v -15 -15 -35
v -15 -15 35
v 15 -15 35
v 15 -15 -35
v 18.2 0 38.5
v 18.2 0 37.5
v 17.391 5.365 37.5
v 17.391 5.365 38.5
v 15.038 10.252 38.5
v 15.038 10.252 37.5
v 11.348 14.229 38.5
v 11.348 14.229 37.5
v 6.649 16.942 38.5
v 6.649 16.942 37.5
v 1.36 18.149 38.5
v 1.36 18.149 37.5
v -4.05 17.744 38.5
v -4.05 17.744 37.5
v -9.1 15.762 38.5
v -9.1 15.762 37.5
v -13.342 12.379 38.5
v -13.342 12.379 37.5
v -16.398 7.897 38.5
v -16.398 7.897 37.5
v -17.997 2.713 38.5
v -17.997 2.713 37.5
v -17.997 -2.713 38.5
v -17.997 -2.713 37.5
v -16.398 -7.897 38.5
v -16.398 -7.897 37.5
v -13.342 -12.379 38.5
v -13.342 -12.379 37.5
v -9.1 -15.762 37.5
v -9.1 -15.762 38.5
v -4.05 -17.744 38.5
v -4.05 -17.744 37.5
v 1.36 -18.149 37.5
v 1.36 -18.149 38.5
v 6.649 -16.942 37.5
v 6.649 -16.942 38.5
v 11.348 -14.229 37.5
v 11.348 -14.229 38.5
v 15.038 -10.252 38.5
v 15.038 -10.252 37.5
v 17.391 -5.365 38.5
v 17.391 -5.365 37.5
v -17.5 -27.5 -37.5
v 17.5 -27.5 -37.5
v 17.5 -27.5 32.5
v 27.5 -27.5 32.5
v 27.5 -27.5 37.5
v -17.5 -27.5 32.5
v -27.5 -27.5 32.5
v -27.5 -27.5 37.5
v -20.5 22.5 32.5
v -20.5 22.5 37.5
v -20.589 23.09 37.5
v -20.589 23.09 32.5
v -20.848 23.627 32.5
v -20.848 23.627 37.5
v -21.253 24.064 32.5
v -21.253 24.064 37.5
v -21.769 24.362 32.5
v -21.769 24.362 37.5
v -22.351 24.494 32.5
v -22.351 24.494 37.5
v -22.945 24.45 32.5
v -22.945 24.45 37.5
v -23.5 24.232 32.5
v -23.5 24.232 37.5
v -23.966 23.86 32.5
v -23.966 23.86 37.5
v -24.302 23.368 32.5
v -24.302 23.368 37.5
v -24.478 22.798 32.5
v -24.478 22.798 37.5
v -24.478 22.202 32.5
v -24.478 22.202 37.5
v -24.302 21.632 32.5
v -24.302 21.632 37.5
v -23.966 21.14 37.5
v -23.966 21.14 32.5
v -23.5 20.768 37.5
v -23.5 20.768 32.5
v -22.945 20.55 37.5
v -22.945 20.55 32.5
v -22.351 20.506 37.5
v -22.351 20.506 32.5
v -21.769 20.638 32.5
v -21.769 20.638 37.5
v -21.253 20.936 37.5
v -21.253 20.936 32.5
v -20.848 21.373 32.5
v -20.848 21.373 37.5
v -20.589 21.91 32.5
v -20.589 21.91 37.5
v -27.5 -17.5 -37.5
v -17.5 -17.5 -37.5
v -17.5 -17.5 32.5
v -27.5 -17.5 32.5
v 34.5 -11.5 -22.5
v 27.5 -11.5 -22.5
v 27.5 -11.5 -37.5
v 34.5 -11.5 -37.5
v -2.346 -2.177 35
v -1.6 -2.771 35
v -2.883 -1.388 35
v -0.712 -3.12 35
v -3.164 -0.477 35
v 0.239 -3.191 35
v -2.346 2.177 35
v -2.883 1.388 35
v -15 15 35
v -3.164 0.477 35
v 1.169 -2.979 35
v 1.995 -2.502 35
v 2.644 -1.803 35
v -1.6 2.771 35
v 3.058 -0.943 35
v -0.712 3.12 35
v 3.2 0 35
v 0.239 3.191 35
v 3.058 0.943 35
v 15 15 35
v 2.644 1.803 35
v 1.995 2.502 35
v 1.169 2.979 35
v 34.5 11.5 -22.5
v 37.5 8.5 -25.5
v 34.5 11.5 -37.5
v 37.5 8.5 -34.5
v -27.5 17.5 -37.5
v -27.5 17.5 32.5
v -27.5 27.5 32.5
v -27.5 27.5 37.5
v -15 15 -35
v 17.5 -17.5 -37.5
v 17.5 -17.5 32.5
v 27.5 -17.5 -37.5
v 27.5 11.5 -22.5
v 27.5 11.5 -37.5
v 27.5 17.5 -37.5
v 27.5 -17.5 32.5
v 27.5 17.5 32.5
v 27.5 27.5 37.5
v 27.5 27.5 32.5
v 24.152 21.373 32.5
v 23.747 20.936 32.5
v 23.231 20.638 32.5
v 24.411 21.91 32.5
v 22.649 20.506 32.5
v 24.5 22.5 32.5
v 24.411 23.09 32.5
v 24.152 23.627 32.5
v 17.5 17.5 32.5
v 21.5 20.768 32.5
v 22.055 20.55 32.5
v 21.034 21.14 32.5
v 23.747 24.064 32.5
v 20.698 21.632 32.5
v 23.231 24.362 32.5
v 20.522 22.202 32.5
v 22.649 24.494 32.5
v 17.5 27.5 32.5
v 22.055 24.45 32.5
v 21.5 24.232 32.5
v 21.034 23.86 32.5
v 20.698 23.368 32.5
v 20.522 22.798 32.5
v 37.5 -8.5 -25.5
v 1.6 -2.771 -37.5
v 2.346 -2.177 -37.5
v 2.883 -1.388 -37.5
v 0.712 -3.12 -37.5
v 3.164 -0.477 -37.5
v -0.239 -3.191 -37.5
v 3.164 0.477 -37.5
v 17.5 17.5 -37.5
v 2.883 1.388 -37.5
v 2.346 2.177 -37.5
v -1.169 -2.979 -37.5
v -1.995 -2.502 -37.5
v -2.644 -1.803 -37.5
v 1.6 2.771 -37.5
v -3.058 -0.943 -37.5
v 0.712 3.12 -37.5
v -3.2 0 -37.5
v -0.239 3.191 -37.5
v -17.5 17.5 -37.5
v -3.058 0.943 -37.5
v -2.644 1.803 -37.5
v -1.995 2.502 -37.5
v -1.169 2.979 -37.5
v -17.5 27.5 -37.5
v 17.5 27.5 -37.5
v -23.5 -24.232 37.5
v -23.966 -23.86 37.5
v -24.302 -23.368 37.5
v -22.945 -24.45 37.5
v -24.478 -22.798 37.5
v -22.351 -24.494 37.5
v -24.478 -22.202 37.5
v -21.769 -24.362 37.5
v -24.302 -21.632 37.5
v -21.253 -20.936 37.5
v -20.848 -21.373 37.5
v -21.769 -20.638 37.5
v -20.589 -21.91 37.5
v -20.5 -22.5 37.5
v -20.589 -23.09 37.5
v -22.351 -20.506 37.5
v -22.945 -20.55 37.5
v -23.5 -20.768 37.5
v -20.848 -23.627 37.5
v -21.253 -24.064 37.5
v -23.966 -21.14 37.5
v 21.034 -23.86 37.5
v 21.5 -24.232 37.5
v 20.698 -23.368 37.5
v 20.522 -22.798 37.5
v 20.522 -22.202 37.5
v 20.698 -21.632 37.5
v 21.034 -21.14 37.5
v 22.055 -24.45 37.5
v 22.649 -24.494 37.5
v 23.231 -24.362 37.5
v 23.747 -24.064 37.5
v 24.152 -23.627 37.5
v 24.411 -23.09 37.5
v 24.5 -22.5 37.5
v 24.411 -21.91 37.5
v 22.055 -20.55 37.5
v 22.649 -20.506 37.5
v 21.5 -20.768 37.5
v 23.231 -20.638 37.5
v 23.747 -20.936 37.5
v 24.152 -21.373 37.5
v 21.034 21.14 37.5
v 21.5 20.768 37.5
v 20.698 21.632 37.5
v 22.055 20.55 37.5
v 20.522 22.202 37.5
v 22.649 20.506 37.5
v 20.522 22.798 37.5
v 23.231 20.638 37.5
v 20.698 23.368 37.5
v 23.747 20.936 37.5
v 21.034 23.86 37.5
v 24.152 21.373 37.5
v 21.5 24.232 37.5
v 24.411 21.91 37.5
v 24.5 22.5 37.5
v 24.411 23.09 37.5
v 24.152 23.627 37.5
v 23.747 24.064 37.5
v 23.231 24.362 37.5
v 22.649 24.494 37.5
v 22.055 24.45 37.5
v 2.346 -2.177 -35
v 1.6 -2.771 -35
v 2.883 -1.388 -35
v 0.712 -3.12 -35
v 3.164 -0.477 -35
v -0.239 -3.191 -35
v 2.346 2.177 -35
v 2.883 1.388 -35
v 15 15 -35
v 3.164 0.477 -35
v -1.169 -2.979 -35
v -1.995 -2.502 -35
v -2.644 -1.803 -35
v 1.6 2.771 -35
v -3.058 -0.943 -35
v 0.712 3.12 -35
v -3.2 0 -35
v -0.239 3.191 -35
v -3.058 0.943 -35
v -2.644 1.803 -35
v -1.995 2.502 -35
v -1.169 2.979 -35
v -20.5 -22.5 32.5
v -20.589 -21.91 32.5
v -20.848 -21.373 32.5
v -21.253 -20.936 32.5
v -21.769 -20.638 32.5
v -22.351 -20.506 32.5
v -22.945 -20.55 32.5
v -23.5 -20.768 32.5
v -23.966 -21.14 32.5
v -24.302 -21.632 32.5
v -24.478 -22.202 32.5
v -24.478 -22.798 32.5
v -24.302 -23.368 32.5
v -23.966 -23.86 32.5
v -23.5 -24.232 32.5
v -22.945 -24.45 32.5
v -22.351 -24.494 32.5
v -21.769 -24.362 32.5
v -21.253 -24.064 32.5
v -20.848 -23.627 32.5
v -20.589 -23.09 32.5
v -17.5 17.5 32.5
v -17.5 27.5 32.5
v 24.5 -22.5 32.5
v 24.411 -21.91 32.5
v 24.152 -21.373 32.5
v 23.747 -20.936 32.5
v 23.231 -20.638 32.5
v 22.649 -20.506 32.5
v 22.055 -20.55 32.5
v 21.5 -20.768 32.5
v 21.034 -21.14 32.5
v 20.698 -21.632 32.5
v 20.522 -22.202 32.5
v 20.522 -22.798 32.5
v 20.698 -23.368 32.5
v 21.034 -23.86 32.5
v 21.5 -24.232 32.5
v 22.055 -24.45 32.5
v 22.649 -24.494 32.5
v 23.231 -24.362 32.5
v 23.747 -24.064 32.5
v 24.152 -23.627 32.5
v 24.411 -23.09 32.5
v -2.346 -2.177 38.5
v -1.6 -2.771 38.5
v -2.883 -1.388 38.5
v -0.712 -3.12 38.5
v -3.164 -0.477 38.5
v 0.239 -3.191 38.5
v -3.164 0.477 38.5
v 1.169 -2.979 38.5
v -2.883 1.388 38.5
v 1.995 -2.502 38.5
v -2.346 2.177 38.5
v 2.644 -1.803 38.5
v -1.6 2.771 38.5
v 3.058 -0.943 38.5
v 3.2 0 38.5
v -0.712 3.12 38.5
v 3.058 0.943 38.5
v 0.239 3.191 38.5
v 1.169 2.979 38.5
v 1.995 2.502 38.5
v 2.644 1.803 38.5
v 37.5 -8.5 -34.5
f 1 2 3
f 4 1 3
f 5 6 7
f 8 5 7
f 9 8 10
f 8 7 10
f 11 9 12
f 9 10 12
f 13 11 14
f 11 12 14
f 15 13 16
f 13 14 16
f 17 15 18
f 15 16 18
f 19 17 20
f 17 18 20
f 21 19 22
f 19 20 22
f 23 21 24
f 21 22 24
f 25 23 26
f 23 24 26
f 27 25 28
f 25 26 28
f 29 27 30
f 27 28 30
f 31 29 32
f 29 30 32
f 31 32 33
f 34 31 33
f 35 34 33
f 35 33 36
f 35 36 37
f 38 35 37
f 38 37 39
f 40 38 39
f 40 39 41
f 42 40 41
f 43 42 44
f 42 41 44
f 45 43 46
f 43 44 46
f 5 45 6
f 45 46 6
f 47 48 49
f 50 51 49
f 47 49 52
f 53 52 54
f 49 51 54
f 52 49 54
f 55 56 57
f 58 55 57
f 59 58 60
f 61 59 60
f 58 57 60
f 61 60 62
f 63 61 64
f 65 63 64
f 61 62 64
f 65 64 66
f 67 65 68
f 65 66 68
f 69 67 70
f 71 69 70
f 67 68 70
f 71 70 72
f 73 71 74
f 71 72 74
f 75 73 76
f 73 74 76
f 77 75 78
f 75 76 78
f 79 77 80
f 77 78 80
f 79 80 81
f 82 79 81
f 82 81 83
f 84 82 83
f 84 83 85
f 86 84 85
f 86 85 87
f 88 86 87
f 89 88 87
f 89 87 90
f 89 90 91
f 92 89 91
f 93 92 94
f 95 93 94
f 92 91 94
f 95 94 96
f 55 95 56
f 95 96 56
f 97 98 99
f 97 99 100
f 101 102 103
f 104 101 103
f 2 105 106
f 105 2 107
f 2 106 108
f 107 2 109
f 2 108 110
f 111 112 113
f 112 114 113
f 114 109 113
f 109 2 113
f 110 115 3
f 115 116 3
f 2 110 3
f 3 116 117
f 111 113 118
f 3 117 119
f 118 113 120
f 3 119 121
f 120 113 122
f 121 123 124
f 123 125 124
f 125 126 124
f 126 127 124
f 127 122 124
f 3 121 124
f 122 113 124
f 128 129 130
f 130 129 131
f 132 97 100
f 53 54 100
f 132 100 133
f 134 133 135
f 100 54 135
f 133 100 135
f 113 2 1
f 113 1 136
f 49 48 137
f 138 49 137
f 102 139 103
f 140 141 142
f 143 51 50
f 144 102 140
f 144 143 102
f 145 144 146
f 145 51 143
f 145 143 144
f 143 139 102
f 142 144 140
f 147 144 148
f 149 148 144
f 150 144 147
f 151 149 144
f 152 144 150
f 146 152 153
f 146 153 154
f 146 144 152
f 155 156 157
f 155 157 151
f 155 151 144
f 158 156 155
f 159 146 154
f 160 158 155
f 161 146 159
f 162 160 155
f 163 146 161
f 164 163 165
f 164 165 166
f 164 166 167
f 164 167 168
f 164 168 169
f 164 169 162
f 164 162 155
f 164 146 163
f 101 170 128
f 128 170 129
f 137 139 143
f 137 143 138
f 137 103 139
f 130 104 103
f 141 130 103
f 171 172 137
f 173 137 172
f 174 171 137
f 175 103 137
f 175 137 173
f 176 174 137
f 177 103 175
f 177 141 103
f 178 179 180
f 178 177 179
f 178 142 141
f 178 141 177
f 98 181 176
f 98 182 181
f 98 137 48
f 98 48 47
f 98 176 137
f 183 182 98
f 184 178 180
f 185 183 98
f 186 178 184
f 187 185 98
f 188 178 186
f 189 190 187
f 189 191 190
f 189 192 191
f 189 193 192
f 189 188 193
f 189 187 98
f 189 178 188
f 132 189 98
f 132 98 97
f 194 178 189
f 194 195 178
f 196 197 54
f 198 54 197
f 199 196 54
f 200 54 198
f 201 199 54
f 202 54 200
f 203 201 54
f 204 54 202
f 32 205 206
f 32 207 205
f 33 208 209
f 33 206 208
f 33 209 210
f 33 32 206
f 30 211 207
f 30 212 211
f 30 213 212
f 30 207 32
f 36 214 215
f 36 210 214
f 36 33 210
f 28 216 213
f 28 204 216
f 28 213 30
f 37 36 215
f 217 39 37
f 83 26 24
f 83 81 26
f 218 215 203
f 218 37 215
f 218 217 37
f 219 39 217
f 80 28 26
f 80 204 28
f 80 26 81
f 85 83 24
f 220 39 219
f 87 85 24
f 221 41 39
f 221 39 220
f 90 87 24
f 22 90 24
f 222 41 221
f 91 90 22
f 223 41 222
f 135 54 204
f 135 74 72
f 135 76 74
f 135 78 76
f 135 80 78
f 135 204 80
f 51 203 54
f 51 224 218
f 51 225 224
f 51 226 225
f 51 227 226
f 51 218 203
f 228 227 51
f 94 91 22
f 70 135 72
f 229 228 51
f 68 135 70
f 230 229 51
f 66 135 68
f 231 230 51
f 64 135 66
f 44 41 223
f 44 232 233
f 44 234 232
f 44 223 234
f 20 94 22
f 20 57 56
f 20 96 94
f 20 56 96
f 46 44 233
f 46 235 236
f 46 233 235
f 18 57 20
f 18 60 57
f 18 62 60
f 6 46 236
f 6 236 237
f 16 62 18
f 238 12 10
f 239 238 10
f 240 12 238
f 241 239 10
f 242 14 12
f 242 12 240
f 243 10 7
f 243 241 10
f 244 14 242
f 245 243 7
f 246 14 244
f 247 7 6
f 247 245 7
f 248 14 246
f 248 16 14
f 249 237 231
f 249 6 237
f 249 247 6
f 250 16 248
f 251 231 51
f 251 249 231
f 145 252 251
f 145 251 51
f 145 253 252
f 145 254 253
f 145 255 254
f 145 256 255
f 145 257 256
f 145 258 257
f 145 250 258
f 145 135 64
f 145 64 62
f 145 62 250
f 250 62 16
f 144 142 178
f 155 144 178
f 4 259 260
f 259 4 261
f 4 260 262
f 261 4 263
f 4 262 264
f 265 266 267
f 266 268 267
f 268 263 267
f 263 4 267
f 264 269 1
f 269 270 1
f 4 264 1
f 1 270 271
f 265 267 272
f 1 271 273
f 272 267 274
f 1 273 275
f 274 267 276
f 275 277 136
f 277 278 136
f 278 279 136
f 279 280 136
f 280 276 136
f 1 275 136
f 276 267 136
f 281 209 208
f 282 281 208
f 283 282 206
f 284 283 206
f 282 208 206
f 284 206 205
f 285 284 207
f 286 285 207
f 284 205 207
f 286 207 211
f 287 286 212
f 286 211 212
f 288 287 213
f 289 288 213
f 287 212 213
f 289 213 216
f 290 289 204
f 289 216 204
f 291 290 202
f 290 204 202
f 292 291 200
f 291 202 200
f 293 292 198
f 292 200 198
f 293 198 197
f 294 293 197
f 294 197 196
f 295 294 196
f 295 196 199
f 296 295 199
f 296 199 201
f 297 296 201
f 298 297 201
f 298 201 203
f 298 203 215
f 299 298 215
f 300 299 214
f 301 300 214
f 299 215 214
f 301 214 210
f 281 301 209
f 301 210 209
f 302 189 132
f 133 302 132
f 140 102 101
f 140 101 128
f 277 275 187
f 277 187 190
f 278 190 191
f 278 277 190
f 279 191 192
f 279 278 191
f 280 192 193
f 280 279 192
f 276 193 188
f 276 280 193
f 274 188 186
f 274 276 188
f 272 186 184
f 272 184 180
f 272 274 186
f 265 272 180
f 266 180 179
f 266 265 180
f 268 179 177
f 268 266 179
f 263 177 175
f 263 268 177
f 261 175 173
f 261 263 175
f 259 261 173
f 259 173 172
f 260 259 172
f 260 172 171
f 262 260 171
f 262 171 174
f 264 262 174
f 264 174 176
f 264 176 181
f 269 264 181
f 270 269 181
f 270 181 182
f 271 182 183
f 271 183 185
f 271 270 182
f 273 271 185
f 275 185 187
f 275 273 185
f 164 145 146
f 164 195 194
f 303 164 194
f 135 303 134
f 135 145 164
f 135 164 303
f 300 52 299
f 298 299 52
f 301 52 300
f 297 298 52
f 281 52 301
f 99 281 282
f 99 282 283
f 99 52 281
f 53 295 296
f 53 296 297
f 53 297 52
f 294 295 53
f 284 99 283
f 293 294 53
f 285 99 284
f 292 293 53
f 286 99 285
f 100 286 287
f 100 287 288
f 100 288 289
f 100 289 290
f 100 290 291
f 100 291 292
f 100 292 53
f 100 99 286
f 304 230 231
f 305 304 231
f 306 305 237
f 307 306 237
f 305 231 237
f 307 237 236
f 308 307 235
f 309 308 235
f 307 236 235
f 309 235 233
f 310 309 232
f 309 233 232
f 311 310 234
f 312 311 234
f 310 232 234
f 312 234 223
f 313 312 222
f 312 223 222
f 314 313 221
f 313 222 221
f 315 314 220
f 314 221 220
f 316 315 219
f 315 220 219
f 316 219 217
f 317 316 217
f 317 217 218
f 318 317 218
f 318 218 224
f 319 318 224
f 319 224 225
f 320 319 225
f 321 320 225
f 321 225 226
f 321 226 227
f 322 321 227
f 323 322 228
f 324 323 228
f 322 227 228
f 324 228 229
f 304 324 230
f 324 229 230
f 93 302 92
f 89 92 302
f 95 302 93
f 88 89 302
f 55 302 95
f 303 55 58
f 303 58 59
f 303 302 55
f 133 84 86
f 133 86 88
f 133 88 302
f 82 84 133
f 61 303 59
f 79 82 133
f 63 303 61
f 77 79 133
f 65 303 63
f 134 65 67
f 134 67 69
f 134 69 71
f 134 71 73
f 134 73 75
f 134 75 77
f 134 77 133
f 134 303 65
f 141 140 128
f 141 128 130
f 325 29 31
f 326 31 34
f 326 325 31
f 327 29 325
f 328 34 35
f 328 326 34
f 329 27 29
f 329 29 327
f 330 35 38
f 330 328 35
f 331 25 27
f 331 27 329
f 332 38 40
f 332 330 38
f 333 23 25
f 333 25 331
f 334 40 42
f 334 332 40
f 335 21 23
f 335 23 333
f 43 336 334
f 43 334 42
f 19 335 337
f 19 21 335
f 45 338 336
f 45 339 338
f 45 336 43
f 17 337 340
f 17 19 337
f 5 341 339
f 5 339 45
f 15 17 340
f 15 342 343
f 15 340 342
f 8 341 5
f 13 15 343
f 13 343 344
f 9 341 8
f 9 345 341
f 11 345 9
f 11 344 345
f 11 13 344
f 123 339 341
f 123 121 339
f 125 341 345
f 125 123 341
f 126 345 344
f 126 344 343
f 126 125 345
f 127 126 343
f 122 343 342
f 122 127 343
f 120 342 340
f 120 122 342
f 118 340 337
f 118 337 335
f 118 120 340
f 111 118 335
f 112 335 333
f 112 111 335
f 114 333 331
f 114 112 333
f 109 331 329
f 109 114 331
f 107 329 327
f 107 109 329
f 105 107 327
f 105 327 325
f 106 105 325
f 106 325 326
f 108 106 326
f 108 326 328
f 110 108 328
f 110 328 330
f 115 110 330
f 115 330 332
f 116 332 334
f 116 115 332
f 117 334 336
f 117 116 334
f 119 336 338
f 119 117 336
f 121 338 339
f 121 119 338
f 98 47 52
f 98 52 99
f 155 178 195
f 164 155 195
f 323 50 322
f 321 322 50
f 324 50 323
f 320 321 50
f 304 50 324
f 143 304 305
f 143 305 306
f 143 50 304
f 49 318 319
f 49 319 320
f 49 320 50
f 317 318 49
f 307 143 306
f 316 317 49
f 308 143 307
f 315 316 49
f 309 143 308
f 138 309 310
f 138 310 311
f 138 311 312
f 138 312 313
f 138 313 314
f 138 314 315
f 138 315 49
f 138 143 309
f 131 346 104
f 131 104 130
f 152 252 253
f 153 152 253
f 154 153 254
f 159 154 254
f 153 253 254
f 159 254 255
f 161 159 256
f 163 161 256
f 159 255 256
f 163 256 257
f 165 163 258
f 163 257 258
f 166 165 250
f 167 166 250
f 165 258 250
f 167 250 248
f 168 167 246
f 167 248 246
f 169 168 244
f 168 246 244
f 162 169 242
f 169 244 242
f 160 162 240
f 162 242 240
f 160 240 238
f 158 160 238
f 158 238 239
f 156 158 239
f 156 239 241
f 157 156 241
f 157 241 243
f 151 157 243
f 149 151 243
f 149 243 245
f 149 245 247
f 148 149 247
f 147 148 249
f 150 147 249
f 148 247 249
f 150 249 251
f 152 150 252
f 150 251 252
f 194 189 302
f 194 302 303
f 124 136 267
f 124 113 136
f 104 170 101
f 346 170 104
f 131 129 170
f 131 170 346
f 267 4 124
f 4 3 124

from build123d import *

# Parameters (mm, degrees)
SKETCH2_W           = 55
SKETCH2_H           = 55
SKETCH2_W_2         = 30
SKETCH2_H_2         = 30
BOSS_EXTRUDE1_DEPTH = 35
SKETCH3_W           = 55
SKETCH3_H           = 55
SKETCH3_R           = 3.2
BOSS_EXTRUDE2_DEPTH = 2.5
SKETCH4_W           = 55
SKETCH4_H           = 55
SKETCH4_R           = 3.2
BOSS_EXTRUDE3_DEPTH = 2.5
SKETCH6_R           = 18.2
SKETCH6_R_2         = 3.2
BOSS_EXTRUDE4_DEPTH = 1
SKETCH7_W           = 15
SKETCH7_H           = 23
BOSS_EXTRUDE5_DEPTH = 10
CHAMFER1_SIZE       = 3
SKETCH8_W           = 10
SKETCH8_H           = 10
CUT_EXTRUDE1_DEPTH  = 70
SKETCH9_R           = 2
CUT_EXTRUDE2_DEPTH  = 5


with BuildPart() as part:
    # Sketch2 → Boss-Extrude1 (new body, symmetric)
    with BuildSketch(Plane.XY):
        Rectangle(SKETCH2_W, SKETCH2_H)
        Rectangle(SKETCH2_W_2, SKETCH2_H_2, mode=Mode.SUBTRACT)
    extrude(amount=BOSS_EXTRUDE1_DEPTH, both=True)

    # Sketch3 → Boss-Extrude2 (add)
    with BuildSketch(Plane.XY.offset(35)):
        Rectangle(SKETCH3_W, SKETCH3_H)
        Circle(SKETCH3_R, mode=Mode.SUBTRACT)
    extrude(amount=BOSS_EXTRUDE2_DEPTH)

    # Sketch4 → Boss-Extrude3 (add)
    with BuildSketch(Plane(origin=(0, 0, -35), x_dir=(-1, 0, 0), z_dir=(0, 0, -1))):
        Rectangle(SKETCH4_W, SKETCH4_H)
        Circle(SKETCH4_R, mode=Mode.SUBTRACT)
    extrude(amount=BOSS_EXTRUDE3_DEPTH)

    # Sketch6 → Boss-Extrude4 (add)
    with BuildSketch(Plane.XY.offset(37.5)):
        Circle(SKETCH6_R)
        Circle(SKETCH6_R_2, mode=Mode.SUBTRACT)
    extrude(amount=BOSS_EXTRUDE4_DEPTH)

    # Sketch7 → Boss-Extrude5 (add)
    with BuildSketch(Plane(origin=(27.5, 0, 0), x_dir=(0, 0, -1), z_dir=(1, 0, 0))):
        with Locations((30, 0)):
            Rectangle(SKETCH7_W, SKETCH7_H)
    extrude(amount=BOSS_EXTRUDE5_DEPTH)

    # Chamfer1
    chamfer1_edges = [part.edges().sort_by_distance(p)[0] for p in [
        (37.5, 0, -22.5),
        (37.5, -11.5, -30),
        (37.5, 0, -37.5),
        (37.5, 11.5, -30),
    ]]
    chamfer(chamfer1_edges, length=CHAMFER1_SIZE)

    # Sketch8 → Cut-Extrude1 (cut)
    with BuildSketch(Plane(origin=(0, 0, -37.5), x_dir=(-1, 0, 0), z_dir=(0, 0, -1))):
        with Locations((-22.5, 22.5)):
            Rectangle(SKETCH8_W, SKETCH8_H)
        with Locations((22.5, 22.5)):
            Rectangle(SKETCH8_W, SKETCH8_H)
        with Locations((-22.5, -22.5)):
            Rectangle(SKETCH8_W, SKETCH8_H)
        with Locations((22.5, -22.5)):
            Rectangle(SKETCH8_W, SKETCH8_H)
    extrude(amount=-CUT_EXTRUDE1_DEPTH, mode=Mode.SUBTRACT)

    # Sketch9 → Cut-Extrude2 (cut)
    with BuildSketch(Plane.XY.offset(37.5)):
        with Locations((-22.5, 22.5)):
            Circle(SKETCH9_R)
        with Locations((22.5, 22.5)):
            Circle(SKETCH9_R)
        with Locations((-22.5, -22.5)):
            Circle(SKETCH9_R)
        with Locations((22.5, -22.5)):
            Circle(SKETCH9_R)
    extrude(amount=-CUT_EXTRUDE2_DEPTH, mode=Mode.SUBTRACT)


solid = part.part
